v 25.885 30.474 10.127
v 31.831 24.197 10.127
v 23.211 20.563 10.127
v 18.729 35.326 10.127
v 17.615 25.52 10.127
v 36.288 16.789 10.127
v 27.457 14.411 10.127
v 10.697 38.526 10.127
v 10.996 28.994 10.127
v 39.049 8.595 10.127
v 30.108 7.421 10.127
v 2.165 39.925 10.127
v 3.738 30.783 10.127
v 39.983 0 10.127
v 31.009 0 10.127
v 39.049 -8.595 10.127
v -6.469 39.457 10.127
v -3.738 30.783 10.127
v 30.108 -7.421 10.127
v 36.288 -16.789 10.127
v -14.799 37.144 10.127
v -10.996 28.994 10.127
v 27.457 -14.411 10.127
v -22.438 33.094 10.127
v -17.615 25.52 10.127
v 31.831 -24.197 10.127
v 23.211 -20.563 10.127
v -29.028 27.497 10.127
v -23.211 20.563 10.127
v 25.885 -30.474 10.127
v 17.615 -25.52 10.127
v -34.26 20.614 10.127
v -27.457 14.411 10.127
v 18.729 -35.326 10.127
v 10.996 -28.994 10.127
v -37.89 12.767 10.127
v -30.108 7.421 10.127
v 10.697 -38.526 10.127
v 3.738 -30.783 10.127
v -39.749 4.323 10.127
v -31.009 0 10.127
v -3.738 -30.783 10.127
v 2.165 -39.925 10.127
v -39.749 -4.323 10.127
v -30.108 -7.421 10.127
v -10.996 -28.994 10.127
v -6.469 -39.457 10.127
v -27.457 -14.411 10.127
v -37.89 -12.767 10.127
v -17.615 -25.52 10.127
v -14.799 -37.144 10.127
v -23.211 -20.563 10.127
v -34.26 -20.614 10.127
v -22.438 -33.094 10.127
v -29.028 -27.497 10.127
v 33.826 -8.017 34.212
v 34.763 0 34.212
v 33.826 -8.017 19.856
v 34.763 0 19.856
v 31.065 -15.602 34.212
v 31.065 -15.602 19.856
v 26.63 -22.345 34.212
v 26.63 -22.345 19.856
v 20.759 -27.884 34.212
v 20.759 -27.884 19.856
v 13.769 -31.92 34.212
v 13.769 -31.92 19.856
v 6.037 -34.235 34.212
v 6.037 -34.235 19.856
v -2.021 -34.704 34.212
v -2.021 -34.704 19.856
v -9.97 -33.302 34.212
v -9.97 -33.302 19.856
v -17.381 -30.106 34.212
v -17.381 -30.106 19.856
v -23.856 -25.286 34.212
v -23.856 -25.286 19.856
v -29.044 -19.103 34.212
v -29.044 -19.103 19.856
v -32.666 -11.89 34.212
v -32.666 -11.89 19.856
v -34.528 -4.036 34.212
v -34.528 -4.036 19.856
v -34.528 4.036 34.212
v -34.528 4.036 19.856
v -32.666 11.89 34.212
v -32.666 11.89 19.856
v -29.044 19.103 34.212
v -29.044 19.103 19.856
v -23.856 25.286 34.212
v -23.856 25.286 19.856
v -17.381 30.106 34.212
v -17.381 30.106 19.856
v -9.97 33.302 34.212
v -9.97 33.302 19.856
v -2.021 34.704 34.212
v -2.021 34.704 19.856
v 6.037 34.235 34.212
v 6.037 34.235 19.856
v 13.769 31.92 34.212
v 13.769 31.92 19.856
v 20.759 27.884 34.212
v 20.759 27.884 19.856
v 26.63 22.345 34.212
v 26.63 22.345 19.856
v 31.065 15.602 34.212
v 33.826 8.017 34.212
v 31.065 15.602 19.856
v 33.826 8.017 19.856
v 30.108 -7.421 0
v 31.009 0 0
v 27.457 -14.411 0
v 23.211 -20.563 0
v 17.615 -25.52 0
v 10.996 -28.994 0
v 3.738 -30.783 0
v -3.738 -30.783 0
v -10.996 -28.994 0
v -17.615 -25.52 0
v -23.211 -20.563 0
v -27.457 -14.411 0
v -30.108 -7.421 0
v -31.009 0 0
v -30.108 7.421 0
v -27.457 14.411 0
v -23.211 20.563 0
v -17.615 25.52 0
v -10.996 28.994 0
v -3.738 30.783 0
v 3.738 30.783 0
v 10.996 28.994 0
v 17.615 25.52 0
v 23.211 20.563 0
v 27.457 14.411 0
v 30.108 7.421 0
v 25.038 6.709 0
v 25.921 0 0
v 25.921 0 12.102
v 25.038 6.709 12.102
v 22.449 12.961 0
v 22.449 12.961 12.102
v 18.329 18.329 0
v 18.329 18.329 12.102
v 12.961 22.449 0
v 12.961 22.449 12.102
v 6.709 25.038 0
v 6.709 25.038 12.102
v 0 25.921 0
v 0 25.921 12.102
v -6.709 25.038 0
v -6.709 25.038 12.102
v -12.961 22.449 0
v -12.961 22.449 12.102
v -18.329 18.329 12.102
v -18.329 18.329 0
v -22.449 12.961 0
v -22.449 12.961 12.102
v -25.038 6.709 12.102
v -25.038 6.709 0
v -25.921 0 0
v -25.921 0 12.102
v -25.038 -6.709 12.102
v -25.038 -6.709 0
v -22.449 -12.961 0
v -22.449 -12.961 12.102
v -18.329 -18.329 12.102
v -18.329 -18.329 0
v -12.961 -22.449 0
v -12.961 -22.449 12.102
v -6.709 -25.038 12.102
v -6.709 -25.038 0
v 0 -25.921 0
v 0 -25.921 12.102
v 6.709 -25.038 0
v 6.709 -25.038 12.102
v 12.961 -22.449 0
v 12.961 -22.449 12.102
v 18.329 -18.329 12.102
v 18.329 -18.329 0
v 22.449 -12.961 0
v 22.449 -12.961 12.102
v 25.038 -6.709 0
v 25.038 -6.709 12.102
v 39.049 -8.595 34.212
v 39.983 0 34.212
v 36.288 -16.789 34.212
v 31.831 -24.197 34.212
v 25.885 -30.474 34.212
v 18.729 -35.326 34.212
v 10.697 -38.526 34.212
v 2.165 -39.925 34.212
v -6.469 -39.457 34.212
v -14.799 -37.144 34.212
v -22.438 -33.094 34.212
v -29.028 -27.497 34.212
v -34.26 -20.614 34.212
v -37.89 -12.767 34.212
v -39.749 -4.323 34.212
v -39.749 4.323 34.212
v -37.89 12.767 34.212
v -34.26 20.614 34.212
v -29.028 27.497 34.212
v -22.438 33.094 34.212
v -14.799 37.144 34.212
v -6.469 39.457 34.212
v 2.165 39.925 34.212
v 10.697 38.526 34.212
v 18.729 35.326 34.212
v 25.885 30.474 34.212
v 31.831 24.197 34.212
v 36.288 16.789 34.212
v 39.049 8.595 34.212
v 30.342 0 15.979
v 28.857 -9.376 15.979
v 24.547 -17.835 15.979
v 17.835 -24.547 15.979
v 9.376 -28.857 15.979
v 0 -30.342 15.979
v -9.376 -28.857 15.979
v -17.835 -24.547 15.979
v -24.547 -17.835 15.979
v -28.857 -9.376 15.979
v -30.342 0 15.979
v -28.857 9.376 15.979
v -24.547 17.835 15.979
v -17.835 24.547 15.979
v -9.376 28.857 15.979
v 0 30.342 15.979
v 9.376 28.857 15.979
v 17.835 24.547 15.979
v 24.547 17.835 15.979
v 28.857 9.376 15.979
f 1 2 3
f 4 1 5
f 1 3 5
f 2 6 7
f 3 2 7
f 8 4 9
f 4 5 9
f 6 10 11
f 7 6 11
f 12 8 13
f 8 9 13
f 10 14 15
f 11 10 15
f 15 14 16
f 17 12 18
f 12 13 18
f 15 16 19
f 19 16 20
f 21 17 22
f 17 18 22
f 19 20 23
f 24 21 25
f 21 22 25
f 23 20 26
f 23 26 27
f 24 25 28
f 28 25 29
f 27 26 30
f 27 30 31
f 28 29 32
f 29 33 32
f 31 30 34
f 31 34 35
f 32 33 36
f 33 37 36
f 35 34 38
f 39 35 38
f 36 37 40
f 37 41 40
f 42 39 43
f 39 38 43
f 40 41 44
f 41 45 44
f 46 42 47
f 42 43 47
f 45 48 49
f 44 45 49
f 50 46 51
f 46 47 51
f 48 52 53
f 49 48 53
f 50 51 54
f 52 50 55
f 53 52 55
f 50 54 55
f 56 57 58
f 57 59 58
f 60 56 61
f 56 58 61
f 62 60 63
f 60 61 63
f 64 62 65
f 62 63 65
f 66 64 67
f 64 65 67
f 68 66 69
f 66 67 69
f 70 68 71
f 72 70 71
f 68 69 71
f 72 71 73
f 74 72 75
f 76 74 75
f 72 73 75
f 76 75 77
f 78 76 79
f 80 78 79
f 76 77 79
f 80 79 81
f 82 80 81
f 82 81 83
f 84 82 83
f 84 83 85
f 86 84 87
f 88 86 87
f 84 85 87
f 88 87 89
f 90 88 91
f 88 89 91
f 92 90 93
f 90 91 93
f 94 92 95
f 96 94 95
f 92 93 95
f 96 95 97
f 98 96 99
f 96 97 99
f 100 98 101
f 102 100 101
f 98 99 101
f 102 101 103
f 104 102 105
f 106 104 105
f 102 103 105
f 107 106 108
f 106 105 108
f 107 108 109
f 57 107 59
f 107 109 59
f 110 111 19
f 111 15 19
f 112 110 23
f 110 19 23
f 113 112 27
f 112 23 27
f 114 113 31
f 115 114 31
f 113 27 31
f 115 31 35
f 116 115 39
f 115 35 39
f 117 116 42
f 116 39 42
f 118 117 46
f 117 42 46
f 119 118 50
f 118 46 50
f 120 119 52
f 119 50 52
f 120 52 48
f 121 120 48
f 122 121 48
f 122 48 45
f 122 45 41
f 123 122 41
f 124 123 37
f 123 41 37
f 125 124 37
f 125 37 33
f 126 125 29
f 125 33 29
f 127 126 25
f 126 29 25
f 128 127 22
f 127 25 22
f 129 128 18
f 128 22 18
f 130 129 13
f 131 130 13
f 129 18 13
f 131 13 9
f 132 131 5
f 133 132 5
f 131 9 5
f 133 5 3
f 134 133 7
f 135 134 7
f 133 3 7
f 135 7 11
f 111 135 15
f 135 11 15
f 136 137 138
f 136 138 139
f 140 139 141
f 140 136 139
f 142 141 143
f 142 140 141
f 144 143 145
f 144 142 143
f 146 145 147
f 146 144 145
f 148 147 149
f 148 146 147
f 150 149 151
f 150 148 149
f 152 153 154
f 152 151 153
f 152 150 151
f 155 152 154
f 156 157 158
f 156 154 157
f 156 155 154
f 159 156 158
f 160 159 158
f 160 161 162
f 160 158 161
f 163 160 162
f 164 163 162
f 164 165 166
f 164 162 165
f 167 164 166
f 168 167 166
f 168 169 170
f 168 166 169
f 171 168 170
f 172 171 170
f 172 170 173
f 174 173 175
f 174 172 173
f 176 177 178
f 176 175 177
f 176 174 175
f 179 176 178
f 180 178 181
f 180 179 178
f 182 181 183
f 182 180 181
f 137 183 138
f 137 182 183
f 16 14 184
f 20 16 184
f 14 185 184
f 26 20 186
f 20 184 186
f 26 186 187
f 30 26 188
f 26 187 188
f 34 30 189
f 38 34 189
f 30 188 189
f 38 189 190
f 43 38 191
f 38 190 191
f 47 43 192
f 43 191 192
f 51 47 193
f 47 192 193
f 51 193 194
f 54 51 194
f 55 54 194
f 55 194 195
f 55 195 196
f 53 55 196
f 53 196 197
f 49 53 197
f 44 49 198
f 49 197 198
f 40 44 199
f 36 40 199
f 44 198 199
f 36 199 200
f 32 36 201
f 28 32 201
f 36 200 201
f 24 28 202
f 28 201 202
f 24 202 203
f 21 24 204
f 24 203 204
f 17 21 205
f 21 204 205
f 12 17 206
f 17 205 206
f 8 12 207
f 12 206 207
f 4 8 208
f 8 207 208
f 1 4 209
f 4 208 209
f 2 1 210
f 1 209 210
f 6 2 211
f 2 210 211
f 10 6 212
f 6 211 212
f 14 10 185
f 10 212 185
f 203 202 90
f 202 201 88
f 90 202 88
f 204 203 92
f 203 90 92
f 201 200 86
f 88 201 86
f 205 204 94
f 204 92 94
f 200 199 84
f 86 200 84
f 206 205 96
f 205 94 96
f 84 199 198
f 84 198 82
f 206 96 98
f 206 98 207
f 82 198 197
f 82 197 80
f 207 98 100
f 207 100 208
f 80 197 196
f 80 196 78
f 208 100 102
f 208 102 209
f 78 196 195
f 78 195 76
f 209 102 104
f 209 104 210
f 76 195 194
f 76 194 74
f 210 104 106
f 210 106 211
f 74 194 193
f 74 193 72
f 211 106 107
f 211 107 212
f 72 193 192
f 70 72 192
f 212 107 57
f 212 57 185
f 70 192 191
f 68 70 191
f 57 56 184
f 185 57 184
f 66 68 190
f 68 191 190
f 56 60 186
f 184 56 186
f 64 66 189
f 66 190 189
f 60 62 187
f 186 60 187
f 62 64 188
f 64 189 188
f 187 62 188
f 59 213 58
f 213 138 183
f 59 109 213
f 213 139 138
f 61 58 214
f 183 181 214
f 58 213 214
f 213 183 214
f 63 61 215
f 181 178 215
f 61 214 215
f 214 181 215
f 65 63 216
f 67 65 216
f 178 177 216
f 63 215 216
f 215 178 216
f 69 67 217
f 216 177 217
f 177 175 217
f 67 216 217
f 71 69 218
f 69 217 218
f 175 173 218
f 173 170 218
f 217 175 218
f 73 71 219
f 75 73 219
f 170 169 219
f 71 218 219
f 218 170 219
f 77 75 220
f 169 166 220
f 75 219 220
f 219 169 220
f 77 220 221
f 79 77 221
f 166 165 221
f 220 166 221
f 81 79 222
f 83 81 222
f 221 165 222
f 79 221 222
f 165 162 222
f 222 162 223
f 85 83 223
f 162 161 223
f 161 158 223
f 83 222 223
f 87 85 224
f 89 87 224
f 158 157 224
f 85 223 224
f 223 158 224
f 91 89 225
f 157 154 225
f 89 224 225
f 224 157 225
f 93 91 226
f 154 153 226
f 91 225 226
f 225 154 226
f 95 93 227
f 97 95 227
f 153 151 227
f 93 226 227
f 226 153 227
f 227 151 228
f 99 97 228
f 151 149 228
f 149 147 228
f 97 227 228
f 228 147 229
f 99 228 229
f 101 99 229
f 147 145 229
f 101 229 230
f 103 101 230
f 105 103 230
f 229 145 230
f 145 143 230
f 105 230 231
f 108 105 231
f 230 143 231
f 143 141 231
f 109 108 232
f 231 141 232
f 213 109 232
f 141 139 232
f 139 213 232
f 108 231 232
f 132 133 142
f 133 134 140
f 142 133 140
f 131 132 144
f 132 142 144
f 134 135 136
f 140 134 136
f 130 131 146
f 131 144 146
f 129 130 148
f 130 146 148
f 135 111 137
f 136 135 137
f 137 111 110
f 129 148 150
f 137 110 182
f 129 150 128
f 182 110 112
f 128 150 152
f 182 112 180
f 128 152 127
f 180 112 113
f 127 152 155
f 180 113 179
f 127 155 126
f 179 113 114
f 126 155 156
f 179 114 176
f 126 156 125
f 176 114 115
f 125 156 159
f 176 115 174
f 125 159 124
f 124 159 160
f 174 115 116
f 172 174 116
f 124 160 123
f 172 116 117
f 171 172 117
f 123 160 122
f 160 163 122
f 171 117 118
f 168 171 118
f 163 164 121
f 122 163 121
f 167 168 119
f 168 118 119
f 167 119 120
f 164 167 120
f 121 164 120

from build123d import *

# Parameters (mm, degrees)
F2_R     = 25.921407
F3_DEPTH = 25


with BuildPart() as f1:
    # F0 (on Front) → F1 (revolve)
    with BuildSketch(Plane.XZ):
        Polygon((0, 10.126797), (0, 0), (31.009387, 0), (31.009387, 10.126797), (39.983399, 10.126797), (39.983399, 34.21212), (34.762897, 34.21212), (34.762897, 19.85573), (23.669325, 10.126797), align=None)
    revolve(axis=Axis((0, 0, 5.063399), (0, 0, -1)))

    # F2 (on Top) → F3 (cut)
    with BuildSketch(Plane.XY):
        Circle(F2_R)
    extrude(amount=F3_DEPTH, mode=Mode.SUBTRACT)


solid = f1.part
